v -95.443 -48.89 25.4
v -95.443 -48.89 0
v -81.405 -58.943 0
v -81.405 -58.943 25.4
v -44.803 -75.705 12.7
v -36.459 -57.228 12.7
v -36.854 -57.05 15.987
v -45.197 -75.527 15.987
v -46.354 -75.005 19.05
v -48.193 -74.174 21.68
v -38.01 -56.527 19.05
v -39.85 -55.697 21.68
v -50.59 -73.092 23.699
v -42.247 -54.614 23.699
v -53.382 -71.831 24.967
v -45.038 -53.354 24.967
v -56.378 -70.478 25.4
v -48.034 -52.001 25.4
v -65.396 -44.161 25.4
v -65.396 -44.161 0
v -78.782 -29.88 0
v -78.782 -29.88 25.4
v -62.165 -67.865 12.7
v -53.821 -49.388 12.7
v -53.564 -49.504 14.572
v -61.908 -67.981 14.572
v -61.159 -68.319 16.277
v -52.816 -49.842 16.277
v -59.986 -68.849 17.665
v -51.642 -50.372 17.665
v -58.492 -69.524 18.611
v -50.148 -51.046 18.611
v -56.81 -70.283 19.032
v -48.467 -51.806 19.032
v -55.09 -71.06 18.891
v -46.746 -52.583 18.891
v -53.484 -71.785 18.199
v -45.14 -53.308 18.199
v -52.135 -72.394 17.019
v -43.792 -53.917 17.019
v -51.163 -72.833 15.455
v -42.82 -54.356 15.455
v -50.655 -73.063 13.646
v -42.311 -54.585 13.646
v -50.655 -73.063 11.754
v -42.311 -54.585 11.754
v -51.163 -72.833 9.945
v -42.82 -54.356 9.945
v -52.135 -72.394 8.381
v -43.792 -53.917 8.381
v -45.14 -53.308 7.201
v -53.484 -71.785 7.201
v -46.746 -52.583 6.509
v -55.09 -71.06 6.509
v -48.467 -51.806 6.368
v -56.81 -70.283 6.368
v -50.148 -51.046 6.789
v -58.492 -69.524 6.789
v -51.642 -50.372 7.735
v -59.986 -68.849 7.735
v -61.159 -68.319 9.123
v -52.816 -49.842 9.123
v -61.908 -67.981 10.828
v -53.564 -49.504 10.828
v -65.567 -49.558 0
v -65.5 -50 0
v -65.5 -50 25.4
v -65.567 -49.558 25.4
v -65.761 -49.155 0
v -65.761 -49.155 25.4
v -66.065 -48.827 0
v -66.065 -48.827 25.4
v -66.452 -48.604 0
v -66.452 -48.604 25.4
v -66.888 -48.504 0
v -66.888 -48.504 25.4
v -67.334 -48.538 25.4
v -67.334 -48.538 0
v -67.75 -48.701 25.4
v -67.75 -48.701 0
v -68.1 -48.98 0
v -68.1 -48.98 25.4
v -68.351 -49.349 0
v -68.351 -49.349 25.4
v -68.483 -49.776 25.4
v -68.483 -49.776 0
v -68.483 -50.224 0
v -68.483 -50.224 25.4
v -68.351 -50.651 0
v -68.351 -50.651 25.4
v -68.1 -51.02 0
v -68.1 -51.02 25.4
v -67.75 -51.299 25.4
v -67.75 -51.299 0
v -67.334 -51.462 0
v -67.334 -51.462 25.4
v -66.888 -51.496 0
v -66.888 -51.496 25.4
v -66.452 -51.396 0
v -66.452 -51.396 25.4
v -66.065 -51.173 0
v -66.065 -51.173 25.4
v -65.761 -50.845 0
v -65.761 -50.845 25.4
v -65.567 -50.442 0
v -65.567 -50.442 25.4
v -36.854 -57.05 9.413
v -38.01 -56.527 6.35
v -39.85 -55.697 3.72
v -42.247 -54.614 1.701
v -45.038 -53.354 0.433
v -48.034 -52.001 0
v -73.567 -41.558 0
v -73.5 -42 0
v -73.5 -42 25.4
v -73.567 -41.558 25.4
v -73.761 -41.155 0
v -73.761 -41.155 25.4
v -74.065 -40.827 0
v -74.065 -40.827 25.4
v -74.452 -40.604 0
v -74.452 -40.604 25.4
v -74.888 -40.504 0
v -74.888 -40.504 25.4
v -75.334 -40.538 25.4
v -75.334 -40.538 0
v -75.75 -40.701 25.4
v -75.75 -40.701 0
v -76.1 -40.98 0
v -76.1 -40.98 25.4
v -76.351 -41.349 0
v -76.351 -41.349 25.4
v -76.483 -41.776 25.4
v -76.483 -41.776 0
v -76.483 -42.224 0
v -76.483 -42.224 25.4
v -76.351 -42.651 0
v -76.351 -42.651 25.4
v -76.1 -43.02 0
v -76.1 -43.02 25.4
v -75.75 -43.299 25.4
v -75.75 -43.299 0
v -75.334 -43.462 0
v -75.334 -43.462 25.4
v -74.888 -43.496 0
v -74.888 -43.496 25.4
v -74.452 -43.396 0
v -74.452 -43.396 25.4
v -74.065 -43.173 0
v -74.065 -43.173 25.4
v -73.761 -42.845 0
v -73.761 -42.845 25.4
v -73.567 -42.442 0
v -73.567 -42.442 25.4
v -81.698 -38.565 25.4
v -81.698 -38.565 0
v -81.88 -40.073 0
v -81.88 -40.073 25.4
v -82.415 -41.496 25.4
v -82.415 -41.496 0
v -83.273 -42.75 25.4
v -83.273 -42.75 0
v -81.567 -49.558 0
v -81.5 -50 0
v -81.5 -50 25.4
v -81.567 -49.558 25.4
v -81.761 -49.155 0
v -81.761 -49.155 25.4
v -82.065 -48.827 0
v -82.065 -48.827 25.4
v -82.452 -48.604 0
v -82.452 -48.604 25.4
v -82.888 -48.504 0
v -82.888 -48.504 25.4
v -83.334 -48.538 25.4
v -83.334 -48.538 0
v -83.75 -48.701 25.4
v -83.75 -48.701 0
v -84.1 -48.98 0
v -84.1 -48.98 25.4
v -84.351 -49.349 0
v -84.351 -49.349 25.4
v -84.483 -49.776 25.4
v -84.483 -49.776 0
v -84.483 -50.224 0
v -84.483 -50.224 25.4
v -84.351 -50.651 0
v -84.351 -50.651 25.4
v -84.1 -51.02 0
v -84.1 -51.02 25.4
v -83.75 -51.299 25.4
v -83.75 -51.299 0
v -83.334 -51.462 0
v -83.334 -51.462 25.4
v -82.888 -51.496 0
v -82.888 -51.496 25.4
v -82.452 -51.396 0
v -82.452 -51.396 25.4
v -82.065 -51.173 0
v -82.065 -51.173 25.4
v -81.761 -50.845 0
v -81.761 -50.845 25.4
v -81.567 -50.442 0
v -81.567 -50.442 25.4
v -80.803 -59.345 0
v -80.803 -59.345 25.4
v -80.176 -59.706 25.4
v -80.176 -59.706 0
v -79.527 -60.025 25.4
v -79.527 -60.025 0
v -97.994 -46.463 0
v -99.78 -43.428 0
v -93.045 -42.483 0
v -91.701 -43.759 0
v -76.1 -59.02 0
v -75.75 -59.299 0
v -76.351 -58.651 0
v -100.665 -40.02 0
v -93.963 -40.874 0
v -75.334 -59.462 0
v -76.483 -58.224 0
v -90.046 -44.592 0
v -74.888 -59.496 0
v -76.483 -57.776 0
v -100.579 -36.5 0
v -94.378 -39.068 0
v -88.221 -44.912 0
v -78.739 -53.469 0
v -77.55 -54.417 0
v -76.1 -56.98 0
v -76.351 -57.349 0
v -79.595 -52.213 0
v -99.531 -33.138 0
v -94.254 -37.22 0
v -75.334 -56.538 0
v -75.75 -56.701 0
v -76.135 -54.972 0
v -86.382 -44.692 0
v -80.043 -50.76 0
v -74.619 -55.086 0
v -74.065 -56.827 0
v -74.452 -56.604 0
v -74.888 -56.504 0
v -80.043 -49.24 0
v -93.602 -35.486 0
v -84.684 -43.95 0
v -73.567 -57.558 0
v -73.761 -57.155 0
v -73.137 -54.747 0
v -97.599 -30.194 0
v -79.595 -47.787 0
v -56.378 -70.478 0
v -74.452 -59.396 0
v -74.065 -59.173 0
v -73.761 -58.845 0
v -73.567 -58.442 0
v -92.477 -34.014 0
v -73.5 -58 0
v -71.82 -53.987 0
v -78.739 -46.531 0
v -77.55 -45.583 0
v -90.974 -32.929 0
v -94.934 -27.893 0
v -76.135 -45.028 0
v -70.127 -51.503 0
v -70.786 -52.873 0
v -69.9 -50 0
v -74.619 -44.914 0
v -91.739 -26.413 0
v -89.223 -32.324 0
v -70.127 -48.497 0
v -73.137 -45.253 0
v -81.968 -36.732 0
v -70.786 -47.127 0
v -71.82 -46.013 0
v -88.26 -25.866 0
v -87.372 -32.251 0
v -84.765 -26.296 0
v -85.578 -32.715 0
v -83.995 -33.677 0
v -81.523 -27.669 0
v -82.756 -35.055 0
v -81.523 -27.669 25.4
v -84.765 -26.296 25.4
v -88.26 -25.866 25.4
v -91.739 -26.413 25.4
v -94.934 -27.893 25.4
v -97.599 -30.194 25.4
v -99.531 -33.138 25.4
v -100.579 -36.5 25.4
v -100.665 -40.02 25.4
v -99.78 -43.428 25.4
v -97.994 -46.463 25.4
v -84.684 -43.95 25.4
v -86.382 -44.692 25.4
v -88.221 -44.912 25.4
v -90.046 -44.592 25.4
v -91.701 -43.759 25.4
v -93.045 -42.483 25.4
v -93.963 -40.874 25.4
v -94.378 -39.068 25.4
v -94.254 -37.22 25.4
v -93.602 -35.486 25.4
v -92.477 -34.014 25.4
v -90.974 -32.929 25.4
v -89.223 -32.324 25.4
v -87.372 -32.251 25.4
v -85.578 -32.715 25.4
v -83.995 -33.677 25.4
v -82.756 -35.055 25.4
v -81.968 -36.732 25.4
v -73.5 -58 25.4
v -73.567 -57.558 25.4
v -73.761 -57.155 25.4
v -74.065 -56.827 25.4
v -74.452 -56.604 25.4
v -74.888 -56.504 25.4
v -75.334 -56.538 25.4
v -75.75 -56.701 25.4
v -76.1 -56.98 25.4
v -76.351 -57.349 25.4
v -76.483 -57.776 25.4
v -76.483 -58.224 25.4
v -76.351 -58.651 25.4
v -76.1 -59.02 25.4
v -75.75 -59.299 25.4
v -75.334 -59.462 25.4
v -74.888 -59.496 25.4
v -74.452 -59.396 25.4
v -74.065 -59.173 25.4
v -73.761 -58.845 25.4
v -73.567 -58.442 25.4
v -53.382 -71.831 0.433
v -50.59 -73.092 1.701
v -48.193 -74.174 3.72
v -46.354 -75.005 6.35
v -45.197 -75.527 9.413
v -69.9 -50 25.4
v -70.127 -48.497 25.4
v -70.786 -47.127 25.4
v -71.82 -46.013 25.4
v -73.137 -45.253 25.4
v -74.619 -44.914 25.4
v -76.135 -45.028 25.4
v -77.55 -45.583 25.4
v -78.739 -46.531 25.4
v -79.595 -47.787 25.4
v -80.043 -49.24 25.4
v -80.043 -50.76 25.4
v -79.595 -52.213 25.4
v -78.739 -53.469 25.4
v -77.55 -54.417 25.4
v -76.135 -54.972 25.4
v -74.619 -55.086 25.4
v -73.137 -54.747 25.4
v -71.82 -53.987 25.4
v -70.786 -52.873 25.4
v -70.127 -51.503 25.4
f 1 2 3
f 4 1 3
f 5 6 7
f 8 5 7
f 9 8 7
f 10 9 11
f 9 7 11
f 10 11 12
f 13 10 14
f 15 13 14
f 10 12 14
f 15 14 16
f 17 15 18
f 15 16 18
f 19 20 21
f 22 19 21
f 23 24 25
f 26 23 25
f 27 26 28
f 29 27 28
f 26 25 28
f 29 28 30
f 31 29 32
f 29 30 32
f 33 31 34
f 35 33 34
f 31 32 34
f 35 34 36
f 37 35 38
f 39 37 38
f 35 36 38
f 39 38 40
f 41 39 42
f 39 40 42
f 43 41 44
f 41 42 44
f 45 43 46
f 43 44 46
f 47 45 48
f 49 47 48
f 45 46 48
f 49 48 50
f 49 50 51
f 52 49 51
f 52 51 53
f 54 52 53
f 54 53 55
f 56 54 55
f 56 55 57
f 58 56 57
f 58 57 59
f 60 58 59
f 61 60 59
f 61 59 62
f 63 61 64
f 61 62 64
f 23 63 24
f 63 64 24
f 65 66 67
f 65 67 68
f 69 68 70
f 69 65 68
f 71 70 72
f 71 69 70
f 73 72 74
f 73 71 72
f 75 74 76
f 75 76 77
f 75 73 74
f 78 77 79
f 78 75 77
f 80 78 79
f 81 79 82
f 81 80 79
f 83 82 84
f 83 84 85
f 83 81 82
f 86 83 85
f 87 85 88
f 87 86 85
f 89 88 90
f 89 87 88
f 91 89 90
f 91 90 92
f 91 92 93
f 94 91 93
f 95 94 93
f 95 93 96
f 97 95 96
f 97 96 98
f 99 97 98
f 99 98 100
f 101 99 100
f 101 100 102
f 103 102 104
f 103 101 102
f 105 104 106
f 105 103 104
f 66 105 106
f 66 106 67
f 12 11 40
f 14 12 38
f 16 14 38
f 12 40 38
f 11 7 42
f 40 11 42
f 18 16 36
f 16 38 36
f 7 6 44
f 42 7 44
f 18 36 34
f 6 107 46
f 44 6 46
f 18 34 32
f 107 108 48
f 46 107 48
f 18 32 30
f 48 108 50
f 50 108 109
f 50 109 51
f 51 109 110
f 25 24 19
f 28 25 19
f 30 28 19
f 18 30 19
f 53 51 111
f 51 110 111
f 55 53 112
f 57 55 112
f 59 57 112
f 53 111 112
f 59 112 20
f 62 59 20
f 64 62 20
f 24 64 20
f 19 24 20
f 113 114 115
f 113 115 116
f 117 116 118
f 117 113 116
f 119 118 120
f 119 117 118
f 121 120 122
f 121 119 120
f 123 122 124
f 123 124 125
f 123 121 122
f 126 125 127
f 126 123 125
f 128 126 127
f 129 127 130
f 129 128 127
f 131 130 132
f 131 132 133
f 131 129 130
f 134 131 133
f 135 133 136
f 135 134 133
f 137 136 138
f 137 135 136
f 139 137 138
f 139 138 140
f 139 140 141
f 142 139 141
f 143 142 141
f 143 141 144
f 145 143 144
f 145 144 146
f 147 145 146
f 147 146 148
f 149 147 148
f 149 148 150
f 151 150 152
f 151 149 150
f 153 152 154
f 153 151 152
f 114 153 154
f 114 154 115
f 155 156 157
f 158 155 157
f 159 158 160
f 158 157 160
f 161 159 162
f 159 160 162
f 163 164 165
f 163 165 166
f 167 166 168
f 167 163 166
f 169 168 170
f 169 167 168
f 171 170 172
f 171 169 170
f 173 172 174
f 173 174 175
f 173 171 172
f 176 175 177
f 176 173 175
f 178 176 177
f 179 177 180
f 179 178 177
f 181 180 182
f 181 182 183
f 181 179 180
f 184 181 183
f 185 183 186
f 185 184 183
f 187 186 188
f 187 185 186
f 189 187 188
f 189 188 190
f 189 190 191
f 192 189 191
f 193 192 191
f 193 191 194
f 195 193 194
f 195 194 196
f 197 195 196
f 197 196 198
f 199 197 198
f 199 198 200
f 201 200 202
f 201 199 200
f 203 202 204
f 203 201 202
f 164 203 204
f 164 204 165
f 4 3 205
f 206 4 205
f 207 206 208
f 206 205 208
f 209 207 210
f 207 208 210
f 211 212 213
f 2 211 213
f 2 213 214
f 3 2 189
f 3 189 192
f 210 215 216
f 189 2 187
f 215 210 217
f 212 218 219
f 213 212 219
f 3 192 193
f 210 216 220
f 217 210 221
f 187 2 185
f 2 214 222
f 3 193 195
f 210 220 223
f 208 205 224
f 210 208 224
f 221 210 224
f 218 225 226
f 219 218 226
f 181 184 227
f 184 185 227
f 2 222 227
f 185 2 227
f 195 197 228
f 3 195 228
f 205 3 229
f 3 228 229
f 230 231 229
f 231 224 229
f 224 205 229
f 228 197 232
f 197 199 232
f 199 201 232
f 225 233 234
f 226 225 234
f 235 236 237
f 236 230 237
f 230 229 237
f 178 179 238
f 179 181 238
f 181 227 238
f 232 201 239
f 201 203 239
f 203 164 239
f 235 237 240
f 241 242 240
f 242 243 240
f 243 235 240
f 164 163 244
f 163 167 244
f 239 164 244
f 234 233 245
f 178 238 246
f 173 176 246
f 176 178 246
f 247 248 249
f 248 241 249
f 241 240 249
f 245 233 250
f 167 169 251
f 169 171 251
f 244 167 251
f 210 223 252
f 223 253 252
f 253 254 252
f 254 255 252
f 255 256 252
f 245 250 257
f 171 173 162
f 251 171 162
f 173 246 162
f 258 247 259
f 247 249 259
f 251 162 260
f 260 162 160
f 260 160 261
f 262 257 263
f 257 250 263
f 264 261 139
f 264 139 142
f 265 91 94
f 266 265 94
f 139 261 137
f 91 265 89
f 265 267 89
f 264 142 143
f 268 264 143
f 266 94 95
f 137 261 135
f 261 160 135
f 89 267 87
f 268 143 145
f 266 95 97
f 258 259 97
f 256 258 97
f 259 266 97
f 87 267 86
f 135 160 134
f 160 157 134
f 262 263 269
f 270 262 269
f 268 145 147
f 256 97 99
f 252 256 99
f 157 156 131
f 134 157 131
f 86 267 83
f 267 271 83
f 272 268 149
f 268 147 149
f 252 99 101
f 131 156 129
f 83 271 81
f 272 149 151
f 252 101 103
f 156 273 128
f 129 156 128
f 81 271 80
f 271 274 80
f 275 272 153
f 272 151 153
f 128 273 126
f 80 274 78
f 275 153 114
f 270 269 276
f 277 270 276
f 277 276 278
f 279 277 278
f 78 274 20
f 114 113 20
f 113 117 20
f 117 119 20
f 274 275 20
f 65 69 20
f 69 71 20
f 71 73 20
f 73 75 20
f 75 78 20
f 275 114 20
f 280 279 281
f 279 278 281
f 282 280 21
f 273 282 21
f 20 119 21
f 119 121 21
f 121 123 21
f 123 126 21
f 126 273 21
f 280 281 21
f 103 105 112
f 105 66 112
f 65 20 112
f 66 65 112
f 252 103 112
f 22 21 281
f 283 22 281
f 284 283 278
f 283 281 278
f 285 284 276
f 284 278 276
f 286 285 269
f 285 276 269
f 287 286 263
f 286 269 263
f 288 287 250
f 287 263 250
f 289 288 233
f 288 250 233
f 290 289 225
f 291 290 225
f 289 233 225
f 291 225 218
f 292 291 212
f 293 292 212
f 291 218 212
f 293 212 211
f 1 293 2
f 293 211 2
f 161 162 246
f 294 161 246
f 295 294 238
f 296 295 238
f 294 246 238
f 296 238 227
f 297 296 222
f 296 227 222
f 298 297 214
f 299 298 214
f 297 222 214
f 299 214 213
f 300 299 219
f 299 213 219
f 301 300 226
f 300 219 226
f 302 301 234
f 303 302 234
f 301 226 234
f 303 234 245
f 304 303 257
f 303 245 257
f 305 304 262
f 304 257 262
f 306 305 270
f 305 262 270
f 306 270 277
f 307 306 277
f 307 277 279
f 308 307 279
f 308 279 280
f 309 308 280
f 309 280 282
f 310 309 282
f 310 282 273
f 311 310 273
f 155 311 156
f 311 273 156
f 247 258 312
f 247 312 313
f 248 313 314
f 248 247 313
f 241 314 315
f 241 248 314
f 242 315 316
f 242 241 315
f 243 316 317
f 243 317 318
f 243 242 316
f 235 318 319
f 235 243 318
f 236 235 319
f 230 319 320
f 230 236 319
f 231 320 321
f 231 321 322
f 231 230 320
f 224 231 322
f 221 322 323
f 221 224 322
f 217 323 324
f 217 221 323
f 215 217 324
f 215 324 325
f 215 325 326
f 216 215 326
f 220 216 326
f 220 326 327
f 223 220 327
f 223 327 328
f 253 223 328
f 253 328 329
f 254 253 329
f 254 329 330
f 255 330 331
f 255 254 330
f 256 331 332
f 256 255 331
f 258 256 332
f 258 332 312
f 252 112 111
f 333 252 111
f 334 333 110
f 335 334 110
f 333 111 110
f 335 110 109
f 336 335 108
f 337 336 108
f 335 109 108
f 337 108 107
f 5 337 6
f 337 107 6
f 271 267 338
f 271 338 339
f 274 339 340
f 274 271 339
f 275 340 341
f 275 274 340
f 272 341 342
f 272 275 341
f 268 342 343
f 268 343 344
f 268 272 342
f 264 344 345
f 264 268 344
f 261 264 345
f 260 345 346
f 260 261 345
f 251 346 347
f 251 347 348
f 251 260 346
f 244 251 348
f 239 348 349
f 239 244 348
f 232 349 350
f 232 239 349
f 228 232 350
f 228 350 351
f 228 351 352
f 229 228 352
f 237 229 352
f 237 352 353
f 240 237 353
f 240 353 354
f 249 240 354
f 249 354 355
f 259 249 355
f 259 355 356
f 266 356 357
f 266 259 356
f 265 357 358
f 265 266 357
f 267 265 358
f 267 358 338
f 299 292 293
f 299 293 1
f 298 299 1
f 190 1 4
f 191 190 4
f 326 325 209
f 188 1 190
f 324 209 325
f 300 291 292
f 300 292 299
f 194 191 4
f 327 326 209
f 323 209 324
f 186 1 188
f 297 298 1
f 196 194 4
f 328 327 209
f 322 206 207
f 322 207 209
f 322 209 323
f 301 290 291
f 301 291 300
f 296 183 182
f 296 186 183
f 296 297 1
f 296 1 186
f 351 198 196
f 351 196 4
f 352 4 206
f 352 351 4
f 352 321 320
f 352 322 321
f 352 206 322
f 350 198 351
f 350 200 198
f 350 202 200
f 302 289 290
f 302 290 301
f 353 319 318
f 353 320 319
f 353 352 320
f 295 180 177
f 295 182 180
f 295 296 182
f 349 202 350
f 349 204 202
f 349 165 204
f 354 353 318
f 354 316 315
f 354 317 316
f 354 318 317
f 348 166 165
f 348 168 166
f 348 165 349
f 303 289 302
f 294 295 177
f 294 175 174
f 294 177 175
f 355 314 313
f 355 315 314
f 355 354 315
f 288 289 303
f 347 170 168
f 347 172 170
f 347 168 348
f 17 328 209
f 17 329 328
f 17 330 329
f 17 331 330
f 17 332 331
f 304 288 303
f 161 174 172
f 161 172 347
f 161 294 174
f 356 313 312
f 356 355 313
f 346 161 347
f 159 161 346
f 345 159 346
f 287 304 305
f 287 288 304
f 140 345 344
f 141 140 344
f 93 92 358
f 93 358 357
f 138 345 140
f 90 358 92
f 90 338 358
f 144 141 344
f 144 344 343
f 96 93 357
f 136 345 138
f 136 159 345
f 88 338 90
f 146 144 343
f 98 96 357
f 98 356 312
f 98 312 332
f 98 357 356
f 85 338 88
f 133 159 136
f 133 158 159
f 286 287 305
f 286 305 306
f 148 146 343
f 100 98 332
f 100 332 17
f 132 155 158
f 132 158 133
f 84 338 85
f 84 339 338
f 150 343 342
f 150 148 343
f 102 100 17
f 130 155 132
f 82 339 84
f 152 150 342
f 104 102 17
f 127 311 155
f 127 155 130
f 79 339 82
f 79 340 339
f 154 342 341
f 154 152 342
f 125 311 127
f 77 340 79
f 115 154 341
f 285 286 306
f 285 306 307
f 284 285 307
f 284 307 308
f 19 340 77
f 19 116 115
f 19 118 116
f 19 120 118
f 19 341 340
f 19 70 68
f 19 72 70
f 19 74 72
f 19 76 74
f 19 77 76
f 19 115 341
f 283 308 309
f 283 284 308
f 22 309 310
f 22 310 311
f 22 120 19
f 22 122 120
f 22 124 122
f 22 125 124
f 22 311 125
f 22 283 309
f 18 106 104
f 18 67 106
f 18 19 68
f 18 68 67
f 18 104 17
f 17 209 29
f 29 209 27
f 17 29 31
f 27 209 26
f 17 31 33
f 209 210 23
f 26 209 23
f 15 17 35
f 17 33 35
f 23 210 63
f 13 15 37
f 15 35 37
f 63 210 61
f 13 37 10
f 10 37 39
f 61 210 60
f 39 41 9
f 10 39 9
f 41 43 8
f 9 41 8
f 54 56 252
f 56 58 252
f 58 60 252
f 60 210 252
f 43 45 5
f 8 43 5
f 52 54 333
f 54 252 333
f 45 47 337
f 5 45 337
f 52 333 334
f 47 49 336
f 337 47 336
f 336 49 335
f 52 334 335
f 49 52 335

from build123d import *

# Parameters (mm, degrees)
SKETCH1_R           = 1.5
SKETCH1_R_2         = 5.1
BOSS_EXTRUDE1_DEPTH = 25.4
SKETCH2_R           = 6.35
CUT_EXTRUDE1_DEPTH  = 20.273760375


with BuildPart() as part:
    # Sketch1 → Boss-Extrude1 (new body)
    with BuildSketch(Plane.XY):
        with BuildLine():
            Line((-36.459452571, -57.227643835), (-65.396139663, -44.161250294))
            Line((-65.396139663, -44.161250294), (-78.782055326, -29.879648176))
            ThreePointArc((-78.782055326, -29.879648176), (-97.599291983, -30.194079121), (-95.442610221, -48.889960647))
            Line((-95.442610221, -48.889960647), (-81.404627284, -58.943195702))
            ThreePointArc((-81.404627284, -58.943195702), (-80.492497638, -59.530606995), (-79.526939494, -60.025308914))
            Line((-79.526939494, -60.025308914), (-44.802914985, -75.704981163))
            Line((-44.802914985, -75.704981163), (-36.459452571, -57.227643835))
        make_face()
        with Locations((-75, -58)):
            Circle(SKETCH1_R, mode=Mode.SUBTRACT)
        with BuildLine():
            ThreePointArc((-81.698176902, -38.564634701), (-82.104807051, -40.800446591), (-83.272619362, -42.74991249))
            ThreePointArc((-83.272619362, -42.74991249), (-93.991546754, -36.32882281), (-81.698176902, -38.564634701))
        make_face(mode=Mode.SUBTRACT)
        with Locations((-83, -50)):
            Circle(SKETCH1_R, mode=Mode.SUBTRACT)
        with Locations((-75, -50)):
            Circle(SKETCH1_R_2, mode=Mode.SUBTRACT)
        with Locations((-75, -42)):
            Circle(SKETCH1_R, mode=Mode.SUBTRACT)
        with Locations((-67, -50)):
            Circle(SKETCH1_R, mode=Mode.SUBTRACT)
    extrude(amount=BOSS_EXTRUDE1_DEPTH)

    # Sketch2 → Cut-Extrude1 (cut)
    with BuildSketch(Plane(origin=(-27.639567431, -61.210272872, 0), x_dir=(0.9113917194185279, -0.41153995404497395, 0), z_dir=(0.411539954044974, 0.911391719418528, 0))):
        with BuildLine():
            ThreePointArc((-22.377381254, 0), (-13.397125133, -3.719743879), (-9.677381254, -12.7))
            Line((-9.677381254, -12.7), (-9.677381254, 0))
            Line((-9.677381254, 0), (-22.377381254, 0))
        make_face()
        with BuildLine():
            ThreePointArc((-9.677381254, -12.7), (-13.397125133, -21.680256121), (-22.377381254, -25.4))
            Line((-22.377381254, -25.4), (-9.677381254, -25.4))
            Line((-9.677381254, -25.4), (-9.677381254, -12.7))
        make_face()
        with Locations(Location((-22.377381254, -12.7, 0), (0, 0, 180))):
            Circle(SKETCH2_R)
    extrude(amount=-CUT_EXTRUDE1_DEPTH, mode=Mode.SUBTRACT)


solid = part.part
